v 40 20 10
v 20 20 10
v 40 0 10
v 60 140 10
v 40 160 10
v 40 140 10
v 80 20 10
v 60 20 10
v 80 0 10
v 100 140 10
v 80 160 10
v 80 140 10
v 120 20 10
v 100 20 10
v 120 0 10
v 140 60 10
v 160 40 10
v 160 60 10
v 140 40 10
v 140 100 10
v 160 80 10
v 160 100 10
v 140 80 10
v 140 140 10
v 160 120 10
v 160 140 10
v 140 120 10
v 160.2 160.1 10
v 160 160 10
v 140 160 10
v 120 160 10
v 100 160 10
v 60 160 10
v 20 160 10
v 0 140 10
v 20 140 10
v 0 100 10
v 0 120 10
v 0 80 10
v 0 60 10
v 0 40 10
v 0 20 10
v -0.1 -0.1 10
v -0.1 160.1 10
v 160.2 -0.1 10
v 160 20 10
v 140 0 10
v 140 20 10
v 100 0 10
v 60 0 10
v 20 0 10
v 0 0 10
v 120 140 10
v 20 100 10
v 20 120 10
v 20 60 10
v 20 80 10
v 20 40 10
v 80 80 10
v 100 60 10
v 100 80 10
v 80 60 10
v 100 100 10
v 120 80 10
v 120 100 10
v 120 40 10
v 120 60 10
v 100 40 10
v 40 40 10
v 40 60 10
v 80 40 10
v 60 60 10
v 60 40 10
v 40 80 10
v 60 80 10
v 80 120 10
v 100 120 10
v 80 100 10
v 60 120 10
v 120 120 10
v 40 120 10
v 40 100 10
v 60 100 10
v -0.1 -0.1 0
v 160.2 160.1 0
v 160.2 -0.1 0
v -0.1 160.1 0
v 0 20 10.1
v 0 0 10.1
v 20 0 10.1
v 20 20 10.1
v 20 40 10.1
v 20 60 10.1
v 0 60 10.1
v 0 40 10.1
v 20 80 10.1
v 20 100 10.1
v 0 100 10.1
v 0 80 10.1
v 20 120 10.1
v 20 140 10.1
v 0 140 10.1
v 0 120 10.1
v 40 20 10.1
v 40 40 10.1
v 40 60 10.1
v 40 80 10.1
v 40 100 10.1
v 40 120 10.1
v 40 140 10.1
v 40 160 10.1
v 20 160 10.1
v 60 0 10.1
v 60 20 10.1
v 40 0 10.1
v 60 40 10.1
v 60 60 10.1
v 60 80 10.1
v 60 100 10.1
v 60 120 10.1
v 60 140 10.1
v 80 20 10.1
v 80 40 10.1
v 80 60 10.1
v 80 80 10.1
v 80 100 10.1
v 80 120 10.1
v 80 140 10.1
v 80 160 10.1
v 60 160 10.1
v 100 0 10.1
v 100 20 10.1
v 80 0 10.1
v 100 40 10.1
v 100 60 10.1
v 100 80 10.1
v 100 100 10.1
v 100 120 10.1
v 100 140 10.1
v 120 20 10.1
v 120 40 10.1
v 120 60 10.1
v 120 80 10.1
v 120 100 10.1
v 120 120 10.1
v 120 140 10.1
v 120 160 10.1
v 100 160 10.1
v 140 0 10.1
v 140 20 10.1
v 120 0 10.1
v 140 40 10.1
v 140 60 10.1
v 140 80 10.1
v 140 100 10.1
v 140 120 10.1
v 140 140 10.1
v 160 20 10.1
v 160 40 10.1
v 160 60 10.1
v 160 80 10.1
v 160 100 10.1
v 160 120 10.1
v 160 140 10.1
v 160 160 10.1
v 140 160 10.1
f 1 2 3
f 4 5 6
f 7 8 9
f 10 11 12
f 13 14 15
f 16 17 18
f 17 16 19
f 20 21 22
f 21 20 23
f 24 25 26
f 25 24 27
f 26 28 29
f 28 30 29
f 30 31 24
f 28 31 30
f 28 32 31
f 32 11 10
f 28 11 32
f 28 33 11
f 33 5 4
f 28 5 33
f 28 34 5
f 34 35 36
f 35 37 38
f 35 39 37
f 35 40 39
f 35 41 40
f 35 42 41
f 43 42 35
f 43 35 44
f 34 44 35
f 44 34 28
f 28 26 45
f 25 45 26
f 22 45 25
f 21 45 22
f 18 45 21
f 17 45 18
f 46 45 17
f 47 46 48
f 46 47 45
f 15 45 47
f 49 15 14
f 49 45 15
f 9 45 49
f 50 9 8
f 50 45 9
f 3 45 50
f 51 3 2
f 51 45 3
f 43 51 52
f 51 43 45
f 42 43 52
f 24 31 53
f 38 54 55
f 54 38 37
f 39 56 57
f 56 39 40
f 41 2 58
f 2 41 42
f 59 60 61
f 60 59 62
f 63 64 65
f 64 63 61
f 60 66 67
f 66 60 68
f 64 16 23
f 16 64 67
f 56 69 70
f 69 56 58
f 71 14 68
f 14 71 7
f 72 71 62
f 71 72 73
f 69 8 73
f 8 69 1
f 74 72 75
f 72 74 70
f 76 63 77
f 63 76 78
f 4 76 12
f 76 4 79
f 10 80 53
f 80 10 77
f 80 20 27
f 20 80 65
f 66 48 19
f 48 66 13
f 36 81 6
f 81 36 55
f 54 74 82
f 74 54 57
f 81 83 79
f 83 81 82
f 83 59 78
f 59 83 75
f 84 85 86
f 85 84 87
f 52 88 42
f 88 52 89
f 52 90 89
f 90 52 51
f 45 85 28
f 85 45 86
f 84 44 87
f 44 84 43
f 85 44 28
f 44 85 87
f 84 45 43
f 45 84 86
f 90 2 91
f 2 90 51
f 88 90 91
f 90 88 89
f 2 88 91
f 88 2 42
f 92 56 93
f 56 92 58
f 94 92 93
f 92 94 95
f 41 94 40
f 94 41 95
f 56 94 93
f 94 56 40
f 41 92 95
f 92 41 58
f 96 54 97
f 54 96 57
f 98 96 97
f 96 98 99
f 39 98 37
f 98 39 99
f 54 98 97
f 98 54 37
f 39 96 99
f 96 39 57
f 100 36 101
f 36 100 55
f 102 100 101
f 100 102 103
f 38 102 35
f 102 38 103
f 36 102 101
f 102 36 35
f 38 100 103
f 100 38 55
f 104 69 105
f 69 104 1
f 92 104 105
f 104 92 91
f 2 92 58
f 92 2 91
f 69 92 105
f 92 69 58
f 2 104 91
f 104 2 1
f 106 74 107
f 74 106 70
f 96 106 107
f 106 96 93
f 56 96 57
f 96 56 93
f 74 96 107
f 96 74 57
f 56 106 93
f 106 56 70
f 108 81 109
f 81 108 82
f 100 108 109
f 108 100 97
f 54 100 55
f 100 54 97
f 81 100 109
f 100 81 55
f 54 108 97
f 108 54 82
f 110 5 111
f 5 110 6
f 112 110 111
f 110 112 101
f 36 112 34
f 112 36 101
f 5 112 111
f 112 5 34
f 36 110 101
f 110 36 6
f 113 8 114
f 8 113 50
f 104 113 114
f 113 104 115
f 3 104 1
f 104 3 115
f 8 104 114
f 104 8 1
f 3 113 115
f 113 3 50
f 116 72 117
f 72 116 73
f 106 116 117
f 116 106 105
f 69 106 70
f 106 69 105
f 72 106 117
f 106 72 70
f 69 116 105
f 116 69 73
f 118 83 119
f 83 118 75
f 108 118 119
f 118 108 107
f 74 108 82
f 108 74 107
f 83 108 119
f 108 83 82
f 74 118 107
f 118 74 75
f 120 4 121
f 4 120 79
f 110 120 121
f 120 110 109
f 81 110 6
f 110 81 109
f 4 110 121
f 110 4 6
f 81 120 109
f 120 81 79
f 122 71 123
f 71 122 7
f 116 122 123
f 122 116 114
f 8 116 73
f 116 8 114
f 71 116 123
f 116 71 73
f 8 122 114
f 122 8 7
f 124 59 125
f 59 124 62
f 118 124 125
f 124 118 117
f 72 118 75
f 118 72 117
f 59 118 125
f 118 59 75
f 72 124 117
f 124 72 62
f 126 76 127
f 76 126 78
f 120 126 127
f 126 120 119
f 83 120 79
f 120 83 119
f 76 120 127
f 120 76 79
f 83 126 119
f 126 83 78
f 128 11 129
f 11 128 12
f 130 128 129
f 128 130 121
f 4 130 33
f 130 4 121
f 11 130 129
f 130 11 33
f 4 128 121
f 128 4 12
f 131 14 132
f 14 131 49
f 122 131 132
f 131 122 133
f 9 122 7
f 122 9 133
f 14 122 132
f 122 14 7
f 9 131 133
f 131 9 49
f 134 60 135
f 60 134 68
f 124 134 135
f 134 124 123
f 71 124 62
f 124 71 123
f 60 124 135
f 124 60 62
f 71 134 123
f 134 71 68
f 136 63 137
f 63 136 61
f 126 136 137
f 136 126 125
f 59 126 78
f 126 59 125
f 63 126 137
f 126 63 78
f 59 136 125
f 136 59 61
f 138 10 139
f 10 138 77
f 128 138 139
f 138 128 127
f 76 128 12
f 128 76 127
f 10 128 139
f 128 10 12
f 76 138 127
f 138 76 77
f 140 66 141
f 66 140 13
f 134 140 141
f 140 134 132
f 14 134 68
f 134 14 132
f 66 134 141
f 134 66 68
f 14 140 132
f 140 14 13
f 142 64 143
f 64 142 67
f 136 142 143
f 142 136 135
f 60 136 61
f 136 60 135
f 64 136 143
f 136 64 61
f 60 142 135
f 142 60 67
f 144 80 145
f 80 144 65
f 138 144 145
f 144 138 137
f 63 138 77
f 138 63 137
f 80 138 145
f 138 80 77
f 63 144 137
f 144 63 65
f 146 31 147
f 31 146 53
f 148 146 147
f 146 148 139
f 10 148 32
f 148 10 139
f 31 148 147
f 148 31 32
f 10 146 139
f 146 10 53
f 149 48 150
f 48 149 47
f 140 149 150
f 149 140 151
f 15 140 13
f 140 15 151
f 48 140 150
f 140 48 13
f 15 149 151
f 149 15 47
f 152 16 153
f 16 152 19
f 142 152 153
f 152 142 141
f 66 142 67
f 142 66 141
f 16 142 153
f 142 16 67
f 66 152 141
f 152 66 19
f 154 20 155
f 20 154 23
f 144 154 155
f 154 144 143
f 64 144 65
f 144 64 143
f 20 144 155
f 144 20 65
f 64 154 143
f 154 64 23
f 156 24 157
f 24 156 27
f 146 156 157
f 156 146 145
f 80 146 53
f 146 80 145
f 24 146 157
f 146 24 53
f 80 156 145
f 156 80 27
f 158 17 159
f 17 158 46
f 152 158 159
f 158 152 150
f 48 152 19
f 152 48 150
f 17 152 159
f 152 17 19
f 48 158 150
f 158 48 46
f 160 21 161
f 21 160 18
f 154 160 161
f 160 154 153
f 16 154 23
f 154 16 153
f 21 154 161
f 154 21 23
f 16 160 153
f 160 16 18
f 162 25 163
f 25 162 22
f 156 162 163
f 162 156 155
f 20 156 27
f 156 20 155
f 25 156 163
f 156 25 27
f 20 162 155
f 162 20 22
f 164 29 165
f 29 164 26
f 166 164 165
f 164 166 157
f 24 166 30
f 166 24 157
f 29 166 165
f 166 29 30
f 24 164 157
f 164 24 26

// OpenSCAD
color ([1,1,1])cube ([160,160,10]);
translate ([-0.1,-0.1,0])color ([1,1,1])cube ([160.3,160.2,10]);

translate ([0,0,5.1])color ([0,0,0])cube ([20,20,5]);
translate ([0,40,5.1])color ([0,0,0])cube ([20,20,5]);
translate ([0,80,5.1])color ([0,0,0])cube ([20,20,5]);
translate ([0,120,5.1])color ([0,0,0])cube ([20,20,5]);

translate ([20,20,5.1])color ([0,0,0])cube ([20,20,5]);
translate ([20,60,5.1])color ([0,0,0])cube ([20,20,5]);
translate ([20,100,5.1])color ([0,0,0])cube ([20,20,5]);
translate ([20,140,5.1])color ([0,0,0])cube ([20,20,5]);

translate ([40,0,5.1])color ([0,0,0])cube ([20,20,5]);
translate ([40,40,5.1])color ([0,0,0])cube ([20,20,5]);
translate ([40,80,5.1])color ([0,0,0])cube ([20,20,5]);
translate ([40,120,5.1])color ([0,0,0])cube ([20,20,5]);

translate ([60,20,5.1])color ([0,0,0])cube ([20,20,5]);
translate ([60,60,5.1])color ([0,0,0])cube ([20,20,5]);
translate ([60,100,5.1])color ([0,0,0])cube ([20,20,5]);
translate ([60,140,5.1])color ([0,0,0])cube ([20,20,5]);

translate ([80,0,5.1])color ([0,0,0])cube ([20,20,5]);
translate ([80,40,5.1])color ([0,0,0])cube ([20,20,5]);
translate ([80,80,5.1])color ([0,0,0])cube ([20,20,5]);
translate ([80,120,5.1])color ([0,0,0])cube ([20,20,5]);

translate ([100,20,5.1])color ([0,0,0])cube ([20,20,5]);
translate ([100,60,5.1])color ([0,0,0])cube ([20,20,5]);
translate ([100,100,5.1])color ([0,0,0])cube ([20,20,5]);
translate ([100,140,5.1])color ([0,0,0])cube ([20,20,5]);

translate ([120,0,5.1])color ([0,0,0])cube ([20,20,5]);
translate ([120,40,5.1])color ([0,0,0])cube ([20,20,5]);
translate ([120,80,5.1])color ([0,0,0])cube ([20,20,5]);
translate ([120,120,5.1])color ([0,0,0])cube ([20,20,5]);

translate ([140,20,5.1])color ([0,0,0])cube ([20,20,5]);
translate ([140,60,5.1])color ([0,0,0])cube ([20,20,5]);
translate ([140,100,5.1])color ([0,0,0])cube ([20,20,5]);
translate ([140,140,5.1])color ([0,0,0])cube ([20,20,5]);
